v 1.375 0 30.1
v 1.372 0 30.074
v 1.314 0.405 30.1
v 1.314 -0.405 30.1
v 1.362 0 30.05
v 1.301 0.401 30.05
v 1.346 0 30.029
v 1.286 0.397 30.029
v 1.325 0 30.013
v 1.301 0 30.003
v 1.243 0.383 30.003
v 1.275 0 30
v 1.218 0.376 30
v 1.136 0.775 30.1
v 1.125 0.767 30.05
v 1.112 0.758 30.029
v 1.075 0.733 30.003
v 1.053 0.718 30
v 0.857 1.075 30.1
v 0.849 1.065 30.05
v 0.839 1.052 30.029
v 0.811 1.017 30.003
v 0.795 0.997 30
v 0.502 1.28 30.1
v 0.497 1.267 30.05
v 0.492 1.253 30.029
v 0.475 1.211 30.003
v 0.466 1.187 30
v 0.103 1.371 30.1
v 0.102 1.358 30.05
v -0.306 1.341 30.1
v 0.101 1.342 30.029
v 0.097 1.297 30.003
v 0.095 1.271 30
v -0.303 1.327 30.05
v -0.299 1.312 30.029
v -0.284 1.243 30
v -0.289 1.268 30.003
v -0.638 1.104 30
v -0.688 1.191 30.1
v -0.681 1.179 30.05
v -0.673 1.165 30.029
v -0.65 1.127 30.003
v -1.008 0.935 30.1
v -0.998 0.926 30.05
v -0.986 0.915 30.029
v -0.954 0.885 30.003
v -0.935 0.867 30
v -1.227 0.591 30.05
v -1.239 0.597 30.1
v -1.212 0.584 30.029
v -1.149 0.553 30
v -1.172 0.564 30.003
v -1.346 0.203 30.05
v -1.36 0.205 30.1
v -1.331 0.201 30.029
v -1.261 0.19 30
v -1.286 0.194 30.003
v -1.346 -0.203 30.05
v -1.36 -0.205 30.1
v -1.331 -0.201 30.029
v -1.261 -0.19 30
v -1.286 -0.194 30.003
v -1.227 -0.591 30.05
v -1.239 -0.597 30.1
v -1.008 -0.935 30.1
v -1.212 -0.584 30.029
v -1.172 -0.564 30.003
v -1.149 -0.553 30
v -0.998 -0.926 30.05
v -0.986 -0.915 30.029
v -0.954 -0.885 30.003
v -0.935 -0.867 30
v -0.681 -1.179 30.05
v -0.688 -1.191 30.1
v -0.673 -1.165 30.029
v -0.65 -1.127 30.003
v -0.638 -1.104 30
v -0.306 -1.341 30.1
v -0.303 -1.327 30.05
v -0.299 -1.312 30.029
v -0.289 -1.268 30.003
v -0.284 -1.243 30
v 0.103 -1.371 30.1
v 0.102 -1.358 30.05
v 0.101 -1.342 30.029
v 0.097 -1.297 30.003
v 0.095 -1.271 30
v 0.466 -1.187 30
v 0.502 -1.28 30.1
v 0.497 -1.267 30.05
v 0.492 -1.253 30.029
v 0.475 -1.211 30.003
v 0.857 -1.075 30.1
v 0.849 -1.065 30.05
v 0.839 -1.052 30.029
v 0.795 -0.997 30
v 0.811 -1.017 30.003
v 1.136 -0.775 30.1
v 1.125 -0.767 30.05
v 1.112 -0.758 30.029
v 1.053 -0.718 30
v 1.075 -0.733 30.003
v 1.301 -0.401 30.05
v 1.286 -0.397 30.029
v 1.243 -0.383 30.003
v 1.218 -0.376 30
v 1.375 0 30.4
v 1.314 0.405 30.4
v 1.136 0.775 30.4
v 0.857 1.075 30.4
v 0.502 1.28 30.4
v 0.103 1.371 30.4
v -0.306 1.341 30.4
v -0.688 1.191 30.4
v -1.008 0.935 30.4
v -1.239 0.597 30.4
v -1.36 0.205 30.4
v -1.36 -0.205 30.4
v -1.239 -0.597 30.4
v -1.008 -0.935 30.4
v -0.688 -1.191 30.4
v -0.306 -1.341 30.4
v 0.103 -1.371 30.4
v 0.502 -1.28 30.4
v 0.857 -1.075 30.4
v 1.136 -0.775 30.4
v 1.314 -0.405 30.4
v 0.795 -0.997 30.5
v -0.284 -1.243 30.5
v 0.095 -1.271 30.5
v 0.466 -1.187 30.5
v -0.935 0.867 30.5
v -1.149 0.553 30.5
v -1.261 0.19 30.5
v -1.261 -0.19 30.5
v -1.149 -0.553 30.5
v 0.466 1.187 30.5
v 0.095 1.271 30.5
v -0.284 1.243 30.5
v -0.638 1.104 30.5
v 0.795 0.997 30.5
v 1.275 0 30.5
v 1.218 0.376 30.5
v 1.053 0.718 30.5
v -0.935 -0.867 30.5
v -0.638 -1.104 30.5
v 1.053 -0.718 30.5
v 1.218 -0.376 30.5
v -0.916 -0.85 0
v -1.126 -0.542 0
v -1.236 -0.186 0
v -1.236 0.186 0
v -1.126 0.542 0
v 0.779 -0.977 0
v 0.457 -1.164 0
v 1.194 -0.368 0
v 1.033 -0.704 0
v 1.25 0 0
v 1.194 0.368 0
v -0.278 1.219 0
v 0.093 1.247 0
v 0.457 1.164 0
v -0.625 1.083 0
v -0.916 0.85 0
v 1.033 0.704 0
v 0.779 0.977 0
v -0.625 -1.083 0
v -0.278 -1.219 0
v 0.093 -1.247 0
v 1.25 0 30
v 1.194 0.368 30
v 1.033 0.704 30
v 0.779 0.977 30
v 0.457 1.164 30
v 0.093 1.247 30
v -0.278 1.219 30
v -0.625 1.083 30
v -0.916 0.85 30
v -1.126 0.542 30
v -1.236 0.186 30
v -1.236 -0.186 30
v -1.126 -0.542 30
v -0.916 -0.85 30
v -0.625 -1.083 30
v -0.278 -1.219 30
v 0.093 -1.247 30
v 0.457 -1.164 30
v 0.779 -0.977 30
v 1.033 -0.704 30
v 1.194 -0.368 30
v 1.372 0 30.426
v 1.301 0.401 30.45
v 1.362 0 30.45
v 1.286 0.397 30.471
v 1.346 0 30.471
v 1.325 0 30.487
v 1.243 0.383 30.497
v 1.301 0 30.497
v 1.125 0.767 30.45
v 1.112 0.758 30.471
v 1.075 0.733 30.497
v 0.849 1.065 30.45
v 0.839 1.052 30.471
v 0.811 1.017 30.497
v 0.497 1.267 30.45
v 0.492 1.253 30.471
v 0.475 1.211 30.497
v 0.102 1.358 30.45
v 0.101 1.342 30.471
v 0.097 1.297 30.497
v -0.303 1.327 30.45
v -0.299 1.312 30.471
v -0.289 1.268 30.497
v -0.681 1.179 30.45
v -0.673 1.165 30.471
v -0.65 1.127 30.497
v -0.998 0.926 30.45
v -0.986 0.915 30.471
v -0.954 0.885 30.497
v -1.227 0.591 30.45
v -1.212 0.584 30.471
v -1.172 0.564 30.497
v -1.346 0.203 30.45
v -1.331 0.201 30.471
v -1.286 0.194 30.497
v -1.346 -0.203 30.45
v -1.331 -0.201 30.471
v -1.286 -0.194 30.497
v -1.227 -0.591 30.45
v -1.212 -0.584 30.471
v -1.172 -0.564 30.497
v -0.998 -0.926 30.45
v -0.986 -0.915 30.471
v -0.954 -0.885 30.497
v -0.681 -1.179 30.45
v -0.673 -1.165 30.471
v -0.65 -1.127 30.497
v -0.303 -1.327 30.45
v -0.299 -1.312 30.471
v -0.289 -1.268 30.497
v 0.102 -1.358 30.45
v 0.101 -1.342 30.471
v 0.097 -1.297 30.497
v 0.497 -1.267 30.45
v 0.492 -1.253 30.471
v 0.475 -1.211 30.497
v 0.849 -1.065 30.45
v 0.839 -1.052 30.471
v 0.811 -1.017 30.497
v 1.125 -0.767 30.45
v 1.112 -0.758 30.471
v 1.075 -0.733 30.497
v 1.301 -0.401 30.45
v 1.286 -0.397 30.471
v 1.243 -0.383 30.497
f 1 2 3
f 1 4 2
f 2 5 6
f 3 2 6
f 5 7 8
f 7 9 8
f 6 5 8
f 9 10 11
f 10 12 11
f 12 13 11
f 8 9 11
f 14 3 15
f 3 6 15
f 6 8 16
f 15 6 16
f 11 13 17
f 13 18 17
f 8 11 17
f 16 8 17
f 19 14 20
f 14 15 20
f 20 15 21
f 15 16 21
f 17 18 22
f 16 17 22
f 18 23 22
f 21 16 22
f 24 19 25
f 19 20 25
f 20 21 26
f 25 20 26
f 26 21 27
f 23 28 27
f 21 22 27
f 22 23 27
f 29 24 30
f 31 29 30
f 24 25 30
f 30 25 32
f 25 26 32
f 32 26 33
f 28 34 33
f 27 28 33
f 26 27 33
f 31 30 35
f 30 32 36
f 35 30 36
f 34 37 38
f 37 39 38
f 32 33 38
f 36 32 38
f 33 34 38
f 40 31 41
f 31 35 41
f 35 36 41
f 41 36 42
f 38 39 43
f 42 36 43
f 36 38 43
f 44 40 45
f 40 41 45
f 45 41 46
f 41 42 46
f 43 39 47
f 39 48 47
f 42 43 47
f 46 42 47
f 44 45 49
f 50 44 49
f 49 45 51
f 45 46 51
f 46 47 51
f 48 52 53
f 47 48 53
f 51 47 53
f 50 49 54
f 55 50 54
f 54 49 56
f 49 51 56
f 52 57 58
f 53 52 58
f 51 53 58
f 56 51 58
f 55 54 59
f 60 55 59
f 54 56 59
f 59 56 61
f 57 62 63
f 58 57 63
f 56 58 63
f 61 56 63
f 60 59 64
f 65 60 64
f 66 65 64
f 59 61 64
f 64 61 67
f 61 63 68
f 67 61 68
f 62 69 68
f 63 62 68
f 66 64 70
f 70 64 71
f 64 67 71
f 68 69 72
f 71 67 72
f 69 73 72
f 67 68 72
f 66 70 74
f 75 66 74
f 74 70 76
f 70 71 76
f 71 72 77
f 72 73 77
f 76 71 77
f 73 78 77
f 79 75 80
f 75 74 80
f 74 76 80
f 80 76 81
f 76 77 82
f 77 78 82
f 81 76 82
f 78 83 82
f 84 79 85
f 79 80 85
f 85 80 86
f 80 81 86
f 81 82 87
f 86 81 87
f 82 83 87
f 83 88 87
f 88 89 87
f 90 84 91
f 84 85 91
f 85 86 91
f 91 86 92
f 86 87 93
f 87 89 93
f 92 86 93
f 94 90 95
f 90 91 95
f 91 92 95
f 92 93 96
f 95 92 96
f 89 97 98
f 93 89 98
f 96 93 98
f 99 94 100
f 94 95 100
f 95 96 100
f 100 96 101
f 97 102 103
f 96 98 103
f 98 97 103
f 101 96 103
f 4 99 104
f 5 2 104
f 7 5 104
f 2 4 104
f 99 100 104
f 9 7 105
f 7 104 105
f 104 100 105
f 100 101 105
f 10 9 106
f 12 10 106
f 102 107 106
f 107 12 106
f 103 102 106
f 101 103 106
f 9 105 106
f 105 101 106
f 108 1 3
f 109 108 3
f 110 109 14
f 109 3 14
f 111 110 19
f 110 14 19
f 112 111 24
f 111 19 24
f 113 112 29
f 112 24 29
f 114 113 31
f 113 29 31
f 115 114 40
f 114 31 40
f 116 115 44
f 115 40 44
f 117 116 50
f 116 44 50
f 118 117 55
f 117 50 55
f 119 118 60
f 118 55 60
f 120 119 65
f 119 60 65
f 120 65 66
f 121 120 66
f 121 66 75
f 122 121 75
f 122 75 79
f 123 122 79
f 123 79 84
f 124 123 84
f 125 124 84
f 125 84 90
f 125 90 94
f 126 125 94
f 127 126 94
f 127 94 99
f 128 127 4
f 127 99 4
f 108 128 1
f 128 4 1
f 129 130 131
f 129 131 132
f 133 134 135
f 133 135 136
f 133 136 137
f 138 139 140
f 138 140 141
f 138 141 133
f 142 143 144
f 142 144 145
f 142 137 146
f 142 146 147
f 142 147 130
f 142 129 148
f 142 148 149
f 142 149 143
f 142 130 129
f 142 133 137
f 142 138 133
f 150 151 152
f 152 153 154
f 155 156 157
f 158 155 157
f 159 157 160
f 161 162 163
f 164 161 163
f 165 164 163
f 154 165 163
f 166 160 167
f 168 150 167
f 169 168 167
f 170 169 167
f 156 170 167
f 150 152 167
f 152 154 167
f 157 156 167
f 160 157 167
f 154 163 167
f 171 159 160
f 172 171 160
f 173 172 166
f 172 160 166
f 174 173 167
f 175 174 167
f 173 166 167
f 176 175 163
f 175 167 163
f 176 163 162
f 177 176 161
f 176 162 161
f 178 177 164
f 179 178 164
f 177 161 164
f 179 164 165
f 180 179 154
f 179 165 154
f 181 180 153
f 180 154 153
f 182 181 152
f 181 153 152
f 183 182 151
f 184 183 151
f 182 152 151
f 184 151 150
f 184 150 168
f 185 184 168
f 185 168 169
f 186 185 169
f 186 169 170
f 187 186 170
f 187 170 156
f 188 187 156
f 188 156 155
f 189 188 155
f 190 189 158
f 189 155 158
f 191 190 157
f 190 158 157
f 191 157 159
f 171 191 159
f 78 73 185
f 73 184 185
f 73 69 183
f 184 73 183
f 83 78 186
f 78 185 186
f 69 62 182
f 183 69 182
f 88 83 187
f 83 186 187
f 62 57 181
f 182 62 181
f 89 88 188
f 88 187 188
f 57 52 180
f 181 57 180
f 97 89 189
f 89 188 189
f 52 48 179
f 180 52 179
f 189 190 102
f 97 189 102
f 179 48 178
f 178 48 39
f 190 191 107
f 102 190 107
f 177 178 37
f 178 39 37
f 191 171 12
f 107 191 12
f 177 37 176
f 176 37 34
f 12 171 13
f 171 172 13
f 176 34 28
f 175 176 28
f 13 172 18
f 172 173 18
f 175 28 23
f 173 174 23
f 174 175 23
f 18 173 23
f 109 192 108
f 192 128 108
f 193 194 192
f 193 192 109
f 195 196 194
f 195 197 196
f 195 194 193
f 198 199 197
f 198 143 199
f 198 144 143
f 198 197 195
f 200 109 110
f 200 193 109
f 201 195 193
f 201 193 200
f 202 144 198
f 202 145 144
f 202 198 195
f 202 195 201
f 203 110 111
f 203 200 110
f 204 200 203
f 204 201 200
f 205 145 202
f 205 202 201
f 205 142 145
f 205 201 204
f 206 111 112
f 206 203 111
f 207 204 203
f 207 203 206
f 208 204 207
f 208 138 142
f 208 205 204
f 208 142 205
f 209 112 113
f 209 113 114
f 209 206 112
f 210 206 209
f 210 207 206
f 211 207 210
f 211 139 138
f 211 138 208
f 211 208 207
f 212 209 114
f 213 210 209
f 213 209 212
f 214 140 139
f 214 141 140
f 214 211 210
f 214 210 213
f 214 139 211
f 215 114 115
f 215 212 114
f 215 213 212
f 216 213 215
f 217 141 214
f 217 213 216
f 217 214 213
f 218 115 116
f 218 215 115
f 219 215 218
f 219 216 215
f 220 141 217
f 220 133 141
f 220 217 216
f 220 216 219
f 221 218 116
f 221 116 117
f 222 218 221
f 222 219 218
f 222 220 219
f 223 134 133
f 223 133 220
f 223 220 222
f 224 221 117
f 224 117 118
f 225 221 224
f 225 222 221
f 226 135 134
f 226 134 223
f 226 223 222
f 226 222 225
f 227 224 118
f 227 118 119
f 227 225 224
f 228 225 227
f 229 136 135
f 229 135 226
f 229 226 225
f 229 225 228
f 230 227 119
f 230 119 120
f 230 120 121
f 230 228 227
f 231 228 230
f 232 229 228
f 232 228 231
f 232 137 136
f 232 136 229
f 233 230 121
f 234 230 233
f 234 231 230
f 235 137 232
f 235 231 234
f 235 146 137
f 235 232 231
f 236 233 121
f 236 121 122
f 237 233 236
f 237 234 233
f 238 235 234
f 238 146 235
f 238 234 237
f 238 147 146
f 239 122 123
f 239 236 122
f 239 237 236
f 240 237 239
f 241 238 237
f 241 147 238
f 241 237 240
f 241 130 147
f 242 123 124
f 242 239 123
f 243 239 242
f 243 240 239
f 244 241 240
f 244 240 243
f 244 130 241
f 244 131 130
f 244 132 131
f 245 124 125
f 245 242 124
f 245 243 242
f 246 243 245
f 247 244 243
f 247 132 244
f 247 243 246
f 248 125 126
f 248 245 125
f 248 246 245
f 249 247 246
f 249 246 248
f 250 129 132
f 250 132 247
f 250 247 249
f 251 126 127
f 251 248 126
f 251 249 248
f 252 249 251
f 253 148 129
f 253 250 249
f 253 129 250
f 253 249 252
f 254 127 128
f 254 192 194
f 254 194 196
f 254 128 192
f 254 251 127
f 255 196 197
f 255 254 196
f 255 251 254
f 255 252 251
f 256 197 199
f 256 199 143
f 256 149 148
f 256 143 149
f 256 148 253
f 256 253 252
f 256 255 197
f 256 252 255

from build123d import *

# Parameters (mm, degrees)
SKETCH2_R           = 1.25
BOSS_EXTRUDE1_DEPTH = 30
SKETCH3_R           = 1.375
BOSS_EXTRUDE2_DEPTH = 0.5
FILLET1_R           = 0.1


with BuildPart() as part:
    # Sketch2 → Boss-Extrude1 (new body)
    with BuildSketch(Plane.XY):
        Circle(SKETCH2_R)
    extrude(amount=BOSS_EXTRUDE1_DEPTH)

    # Sketch3 → Boss-Extrude2 (add)
    with BuildSketch(Plane.XY.offset(30)):
        Circle(SKETCH3_R)
    extrude(amount=BOSS_EXTRUDE2_DEPTH)

    # Fillet1
    fillet1_edges = [part.edges().sort_by_distance(p)[0] for p in [
        (-1.375, 0, 30),
        (-1.375, 0, 30.5),
    ]]
    fillet(fillet1_edges, radius=FILLET1_R)


solid = part.part
